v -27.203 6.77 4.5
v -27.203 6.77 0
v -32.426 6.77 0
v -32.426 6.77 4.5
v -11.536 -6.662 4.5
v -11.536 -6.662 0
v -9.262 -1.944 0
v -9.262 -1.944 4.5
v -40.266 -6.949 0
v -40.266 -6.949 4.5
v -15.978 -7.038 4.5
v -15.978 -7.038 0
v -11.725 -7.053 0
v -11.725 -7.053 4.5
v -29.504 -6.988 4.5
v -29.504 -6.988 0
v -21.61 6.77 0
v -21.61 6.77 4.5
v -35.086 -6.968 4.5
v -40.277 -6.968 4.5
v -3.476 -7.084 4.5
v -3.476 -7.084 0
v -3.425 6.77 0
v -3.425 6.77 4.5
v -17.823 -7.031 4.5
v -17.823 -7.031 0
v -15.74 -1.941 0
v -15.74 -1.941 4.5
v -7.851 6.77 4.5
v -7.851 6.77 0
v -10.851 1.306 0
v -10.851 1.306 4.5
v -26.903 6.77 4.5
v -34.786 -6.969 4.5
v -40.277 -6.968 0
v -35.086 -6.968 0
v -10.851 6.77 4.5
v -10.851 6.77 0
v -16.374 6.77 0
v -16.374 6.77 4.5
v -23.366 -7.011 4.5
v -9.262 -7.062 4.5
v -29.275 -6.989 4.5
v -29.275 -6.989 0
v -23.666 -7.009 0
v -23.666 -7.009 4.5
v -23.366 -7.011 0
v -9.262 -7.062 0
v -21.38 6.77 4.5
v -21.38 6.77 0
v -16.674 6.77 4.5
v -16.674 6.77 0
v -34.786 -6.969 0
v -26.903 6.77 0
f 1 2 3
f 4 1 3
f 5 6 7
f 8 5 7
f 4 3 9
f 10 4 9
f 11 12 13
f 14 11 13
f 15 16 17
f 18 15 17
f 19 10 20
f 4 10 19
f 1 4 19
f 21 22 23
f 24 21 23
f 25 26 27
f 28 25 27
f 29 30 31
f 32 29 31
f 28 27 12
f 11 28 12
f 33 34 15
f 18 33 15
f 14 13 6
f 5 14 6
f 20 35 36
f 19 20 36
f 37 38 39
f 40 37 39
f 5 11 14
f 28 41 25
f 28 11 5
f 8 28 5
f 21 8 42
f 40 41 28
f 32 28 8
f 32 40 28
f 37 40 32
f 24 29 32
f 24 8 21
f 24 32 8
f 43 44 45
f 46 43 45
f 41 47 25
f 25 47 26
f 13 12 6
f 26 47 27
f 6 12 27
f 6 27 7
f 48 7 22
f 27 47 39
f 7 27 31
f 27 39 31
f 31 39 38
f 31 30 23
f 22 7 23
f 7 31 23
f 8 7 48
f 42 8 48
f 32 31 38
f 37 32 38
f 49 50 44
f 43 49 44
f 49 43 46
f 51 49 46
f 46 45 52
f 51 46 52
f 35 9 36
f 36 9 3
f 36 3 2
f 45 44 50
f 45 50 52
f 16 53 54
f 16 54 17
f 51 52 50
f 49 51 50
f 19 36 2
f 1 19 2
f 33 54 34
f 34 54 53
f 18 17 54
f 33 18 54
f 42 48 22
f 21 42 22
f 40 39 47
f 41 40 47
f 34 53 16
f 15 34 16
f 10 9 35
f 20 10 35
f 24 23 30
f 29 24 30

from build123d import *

# Parameters (mm, degrees)
F1_DEPTH = 4.5


# Not quite as in the source:
# - a feature names something its author has since deleted; it is built from what else it names


with BuildPart() as f1:
    # F0 (on Top) → F1 (new body)
    with BuildSketch(Plane.XY):
        Polygon((-3.4254482334, 6.7703626119), (-7.8505282334, 6.7703626119), (-10.8505282334, 1.3056819865), (-10.8505282334, 6.7703626119), (-16.3737182334, 6.7703626119), (-23.3664704371, -7.0105993377), (-17.822726575, -7.0309609225), (-15.7404388942, -1.9405601371), (-15.978364491, -7.0377350693), (-11.7246839348, -7.053358388), (-11.5361148701, -6.6621245411), (-9.2622392988, -1.9443990291), (-9.2622392988, -7.0624026867), (-3.4763325698, -7.08365371), align=None)
    extrude(amount=F1_DEPTH)


with BuildPart() as f1b:
    # F0 (on Top) → F1, piece 2 (new body)
    with BuildSketch(Plane.XY):
        Polygon((-32.4264727533, 6.7703626119), (-40.2658395469, -6.9485297427), (-40.2772985399, -6.9675564117), (-35.0855463293, -6.9675564117), (-27.203282851, 6.7703626119), align=None)
    extrude(amount=F1_DEPTH)


with BuildPart() as f1c:
    # F0 (on Top) → F1, piece 3 (new body)
    with BuildSketch(Plane.XY):
        Polygon((-21.6101612896, 6.7703626119), (-26.903282851, 6.7703626119), (-34.7861772074, -6.9686559628), (-29.5041866934, -6.9880561552), align=None)
    extrude(amount=F1_DEPTH)


with BuildPart() as f1d:
    # F0 (on Top) → F1, piece 4 (new body)
    with BuildSketch(Plane.XY):
        Polygon((-16.6737182334, 6.7703626119), (-21.380092851, 6.7703626119), (-29.2746020719, -6.9888993952), (-23.6659123659, -7.0094995192), align=None)
    extrude(amount=F1_DEPTH)


solid = Compound([f1.part, f1b.part, f1c.part, f1d.part])
